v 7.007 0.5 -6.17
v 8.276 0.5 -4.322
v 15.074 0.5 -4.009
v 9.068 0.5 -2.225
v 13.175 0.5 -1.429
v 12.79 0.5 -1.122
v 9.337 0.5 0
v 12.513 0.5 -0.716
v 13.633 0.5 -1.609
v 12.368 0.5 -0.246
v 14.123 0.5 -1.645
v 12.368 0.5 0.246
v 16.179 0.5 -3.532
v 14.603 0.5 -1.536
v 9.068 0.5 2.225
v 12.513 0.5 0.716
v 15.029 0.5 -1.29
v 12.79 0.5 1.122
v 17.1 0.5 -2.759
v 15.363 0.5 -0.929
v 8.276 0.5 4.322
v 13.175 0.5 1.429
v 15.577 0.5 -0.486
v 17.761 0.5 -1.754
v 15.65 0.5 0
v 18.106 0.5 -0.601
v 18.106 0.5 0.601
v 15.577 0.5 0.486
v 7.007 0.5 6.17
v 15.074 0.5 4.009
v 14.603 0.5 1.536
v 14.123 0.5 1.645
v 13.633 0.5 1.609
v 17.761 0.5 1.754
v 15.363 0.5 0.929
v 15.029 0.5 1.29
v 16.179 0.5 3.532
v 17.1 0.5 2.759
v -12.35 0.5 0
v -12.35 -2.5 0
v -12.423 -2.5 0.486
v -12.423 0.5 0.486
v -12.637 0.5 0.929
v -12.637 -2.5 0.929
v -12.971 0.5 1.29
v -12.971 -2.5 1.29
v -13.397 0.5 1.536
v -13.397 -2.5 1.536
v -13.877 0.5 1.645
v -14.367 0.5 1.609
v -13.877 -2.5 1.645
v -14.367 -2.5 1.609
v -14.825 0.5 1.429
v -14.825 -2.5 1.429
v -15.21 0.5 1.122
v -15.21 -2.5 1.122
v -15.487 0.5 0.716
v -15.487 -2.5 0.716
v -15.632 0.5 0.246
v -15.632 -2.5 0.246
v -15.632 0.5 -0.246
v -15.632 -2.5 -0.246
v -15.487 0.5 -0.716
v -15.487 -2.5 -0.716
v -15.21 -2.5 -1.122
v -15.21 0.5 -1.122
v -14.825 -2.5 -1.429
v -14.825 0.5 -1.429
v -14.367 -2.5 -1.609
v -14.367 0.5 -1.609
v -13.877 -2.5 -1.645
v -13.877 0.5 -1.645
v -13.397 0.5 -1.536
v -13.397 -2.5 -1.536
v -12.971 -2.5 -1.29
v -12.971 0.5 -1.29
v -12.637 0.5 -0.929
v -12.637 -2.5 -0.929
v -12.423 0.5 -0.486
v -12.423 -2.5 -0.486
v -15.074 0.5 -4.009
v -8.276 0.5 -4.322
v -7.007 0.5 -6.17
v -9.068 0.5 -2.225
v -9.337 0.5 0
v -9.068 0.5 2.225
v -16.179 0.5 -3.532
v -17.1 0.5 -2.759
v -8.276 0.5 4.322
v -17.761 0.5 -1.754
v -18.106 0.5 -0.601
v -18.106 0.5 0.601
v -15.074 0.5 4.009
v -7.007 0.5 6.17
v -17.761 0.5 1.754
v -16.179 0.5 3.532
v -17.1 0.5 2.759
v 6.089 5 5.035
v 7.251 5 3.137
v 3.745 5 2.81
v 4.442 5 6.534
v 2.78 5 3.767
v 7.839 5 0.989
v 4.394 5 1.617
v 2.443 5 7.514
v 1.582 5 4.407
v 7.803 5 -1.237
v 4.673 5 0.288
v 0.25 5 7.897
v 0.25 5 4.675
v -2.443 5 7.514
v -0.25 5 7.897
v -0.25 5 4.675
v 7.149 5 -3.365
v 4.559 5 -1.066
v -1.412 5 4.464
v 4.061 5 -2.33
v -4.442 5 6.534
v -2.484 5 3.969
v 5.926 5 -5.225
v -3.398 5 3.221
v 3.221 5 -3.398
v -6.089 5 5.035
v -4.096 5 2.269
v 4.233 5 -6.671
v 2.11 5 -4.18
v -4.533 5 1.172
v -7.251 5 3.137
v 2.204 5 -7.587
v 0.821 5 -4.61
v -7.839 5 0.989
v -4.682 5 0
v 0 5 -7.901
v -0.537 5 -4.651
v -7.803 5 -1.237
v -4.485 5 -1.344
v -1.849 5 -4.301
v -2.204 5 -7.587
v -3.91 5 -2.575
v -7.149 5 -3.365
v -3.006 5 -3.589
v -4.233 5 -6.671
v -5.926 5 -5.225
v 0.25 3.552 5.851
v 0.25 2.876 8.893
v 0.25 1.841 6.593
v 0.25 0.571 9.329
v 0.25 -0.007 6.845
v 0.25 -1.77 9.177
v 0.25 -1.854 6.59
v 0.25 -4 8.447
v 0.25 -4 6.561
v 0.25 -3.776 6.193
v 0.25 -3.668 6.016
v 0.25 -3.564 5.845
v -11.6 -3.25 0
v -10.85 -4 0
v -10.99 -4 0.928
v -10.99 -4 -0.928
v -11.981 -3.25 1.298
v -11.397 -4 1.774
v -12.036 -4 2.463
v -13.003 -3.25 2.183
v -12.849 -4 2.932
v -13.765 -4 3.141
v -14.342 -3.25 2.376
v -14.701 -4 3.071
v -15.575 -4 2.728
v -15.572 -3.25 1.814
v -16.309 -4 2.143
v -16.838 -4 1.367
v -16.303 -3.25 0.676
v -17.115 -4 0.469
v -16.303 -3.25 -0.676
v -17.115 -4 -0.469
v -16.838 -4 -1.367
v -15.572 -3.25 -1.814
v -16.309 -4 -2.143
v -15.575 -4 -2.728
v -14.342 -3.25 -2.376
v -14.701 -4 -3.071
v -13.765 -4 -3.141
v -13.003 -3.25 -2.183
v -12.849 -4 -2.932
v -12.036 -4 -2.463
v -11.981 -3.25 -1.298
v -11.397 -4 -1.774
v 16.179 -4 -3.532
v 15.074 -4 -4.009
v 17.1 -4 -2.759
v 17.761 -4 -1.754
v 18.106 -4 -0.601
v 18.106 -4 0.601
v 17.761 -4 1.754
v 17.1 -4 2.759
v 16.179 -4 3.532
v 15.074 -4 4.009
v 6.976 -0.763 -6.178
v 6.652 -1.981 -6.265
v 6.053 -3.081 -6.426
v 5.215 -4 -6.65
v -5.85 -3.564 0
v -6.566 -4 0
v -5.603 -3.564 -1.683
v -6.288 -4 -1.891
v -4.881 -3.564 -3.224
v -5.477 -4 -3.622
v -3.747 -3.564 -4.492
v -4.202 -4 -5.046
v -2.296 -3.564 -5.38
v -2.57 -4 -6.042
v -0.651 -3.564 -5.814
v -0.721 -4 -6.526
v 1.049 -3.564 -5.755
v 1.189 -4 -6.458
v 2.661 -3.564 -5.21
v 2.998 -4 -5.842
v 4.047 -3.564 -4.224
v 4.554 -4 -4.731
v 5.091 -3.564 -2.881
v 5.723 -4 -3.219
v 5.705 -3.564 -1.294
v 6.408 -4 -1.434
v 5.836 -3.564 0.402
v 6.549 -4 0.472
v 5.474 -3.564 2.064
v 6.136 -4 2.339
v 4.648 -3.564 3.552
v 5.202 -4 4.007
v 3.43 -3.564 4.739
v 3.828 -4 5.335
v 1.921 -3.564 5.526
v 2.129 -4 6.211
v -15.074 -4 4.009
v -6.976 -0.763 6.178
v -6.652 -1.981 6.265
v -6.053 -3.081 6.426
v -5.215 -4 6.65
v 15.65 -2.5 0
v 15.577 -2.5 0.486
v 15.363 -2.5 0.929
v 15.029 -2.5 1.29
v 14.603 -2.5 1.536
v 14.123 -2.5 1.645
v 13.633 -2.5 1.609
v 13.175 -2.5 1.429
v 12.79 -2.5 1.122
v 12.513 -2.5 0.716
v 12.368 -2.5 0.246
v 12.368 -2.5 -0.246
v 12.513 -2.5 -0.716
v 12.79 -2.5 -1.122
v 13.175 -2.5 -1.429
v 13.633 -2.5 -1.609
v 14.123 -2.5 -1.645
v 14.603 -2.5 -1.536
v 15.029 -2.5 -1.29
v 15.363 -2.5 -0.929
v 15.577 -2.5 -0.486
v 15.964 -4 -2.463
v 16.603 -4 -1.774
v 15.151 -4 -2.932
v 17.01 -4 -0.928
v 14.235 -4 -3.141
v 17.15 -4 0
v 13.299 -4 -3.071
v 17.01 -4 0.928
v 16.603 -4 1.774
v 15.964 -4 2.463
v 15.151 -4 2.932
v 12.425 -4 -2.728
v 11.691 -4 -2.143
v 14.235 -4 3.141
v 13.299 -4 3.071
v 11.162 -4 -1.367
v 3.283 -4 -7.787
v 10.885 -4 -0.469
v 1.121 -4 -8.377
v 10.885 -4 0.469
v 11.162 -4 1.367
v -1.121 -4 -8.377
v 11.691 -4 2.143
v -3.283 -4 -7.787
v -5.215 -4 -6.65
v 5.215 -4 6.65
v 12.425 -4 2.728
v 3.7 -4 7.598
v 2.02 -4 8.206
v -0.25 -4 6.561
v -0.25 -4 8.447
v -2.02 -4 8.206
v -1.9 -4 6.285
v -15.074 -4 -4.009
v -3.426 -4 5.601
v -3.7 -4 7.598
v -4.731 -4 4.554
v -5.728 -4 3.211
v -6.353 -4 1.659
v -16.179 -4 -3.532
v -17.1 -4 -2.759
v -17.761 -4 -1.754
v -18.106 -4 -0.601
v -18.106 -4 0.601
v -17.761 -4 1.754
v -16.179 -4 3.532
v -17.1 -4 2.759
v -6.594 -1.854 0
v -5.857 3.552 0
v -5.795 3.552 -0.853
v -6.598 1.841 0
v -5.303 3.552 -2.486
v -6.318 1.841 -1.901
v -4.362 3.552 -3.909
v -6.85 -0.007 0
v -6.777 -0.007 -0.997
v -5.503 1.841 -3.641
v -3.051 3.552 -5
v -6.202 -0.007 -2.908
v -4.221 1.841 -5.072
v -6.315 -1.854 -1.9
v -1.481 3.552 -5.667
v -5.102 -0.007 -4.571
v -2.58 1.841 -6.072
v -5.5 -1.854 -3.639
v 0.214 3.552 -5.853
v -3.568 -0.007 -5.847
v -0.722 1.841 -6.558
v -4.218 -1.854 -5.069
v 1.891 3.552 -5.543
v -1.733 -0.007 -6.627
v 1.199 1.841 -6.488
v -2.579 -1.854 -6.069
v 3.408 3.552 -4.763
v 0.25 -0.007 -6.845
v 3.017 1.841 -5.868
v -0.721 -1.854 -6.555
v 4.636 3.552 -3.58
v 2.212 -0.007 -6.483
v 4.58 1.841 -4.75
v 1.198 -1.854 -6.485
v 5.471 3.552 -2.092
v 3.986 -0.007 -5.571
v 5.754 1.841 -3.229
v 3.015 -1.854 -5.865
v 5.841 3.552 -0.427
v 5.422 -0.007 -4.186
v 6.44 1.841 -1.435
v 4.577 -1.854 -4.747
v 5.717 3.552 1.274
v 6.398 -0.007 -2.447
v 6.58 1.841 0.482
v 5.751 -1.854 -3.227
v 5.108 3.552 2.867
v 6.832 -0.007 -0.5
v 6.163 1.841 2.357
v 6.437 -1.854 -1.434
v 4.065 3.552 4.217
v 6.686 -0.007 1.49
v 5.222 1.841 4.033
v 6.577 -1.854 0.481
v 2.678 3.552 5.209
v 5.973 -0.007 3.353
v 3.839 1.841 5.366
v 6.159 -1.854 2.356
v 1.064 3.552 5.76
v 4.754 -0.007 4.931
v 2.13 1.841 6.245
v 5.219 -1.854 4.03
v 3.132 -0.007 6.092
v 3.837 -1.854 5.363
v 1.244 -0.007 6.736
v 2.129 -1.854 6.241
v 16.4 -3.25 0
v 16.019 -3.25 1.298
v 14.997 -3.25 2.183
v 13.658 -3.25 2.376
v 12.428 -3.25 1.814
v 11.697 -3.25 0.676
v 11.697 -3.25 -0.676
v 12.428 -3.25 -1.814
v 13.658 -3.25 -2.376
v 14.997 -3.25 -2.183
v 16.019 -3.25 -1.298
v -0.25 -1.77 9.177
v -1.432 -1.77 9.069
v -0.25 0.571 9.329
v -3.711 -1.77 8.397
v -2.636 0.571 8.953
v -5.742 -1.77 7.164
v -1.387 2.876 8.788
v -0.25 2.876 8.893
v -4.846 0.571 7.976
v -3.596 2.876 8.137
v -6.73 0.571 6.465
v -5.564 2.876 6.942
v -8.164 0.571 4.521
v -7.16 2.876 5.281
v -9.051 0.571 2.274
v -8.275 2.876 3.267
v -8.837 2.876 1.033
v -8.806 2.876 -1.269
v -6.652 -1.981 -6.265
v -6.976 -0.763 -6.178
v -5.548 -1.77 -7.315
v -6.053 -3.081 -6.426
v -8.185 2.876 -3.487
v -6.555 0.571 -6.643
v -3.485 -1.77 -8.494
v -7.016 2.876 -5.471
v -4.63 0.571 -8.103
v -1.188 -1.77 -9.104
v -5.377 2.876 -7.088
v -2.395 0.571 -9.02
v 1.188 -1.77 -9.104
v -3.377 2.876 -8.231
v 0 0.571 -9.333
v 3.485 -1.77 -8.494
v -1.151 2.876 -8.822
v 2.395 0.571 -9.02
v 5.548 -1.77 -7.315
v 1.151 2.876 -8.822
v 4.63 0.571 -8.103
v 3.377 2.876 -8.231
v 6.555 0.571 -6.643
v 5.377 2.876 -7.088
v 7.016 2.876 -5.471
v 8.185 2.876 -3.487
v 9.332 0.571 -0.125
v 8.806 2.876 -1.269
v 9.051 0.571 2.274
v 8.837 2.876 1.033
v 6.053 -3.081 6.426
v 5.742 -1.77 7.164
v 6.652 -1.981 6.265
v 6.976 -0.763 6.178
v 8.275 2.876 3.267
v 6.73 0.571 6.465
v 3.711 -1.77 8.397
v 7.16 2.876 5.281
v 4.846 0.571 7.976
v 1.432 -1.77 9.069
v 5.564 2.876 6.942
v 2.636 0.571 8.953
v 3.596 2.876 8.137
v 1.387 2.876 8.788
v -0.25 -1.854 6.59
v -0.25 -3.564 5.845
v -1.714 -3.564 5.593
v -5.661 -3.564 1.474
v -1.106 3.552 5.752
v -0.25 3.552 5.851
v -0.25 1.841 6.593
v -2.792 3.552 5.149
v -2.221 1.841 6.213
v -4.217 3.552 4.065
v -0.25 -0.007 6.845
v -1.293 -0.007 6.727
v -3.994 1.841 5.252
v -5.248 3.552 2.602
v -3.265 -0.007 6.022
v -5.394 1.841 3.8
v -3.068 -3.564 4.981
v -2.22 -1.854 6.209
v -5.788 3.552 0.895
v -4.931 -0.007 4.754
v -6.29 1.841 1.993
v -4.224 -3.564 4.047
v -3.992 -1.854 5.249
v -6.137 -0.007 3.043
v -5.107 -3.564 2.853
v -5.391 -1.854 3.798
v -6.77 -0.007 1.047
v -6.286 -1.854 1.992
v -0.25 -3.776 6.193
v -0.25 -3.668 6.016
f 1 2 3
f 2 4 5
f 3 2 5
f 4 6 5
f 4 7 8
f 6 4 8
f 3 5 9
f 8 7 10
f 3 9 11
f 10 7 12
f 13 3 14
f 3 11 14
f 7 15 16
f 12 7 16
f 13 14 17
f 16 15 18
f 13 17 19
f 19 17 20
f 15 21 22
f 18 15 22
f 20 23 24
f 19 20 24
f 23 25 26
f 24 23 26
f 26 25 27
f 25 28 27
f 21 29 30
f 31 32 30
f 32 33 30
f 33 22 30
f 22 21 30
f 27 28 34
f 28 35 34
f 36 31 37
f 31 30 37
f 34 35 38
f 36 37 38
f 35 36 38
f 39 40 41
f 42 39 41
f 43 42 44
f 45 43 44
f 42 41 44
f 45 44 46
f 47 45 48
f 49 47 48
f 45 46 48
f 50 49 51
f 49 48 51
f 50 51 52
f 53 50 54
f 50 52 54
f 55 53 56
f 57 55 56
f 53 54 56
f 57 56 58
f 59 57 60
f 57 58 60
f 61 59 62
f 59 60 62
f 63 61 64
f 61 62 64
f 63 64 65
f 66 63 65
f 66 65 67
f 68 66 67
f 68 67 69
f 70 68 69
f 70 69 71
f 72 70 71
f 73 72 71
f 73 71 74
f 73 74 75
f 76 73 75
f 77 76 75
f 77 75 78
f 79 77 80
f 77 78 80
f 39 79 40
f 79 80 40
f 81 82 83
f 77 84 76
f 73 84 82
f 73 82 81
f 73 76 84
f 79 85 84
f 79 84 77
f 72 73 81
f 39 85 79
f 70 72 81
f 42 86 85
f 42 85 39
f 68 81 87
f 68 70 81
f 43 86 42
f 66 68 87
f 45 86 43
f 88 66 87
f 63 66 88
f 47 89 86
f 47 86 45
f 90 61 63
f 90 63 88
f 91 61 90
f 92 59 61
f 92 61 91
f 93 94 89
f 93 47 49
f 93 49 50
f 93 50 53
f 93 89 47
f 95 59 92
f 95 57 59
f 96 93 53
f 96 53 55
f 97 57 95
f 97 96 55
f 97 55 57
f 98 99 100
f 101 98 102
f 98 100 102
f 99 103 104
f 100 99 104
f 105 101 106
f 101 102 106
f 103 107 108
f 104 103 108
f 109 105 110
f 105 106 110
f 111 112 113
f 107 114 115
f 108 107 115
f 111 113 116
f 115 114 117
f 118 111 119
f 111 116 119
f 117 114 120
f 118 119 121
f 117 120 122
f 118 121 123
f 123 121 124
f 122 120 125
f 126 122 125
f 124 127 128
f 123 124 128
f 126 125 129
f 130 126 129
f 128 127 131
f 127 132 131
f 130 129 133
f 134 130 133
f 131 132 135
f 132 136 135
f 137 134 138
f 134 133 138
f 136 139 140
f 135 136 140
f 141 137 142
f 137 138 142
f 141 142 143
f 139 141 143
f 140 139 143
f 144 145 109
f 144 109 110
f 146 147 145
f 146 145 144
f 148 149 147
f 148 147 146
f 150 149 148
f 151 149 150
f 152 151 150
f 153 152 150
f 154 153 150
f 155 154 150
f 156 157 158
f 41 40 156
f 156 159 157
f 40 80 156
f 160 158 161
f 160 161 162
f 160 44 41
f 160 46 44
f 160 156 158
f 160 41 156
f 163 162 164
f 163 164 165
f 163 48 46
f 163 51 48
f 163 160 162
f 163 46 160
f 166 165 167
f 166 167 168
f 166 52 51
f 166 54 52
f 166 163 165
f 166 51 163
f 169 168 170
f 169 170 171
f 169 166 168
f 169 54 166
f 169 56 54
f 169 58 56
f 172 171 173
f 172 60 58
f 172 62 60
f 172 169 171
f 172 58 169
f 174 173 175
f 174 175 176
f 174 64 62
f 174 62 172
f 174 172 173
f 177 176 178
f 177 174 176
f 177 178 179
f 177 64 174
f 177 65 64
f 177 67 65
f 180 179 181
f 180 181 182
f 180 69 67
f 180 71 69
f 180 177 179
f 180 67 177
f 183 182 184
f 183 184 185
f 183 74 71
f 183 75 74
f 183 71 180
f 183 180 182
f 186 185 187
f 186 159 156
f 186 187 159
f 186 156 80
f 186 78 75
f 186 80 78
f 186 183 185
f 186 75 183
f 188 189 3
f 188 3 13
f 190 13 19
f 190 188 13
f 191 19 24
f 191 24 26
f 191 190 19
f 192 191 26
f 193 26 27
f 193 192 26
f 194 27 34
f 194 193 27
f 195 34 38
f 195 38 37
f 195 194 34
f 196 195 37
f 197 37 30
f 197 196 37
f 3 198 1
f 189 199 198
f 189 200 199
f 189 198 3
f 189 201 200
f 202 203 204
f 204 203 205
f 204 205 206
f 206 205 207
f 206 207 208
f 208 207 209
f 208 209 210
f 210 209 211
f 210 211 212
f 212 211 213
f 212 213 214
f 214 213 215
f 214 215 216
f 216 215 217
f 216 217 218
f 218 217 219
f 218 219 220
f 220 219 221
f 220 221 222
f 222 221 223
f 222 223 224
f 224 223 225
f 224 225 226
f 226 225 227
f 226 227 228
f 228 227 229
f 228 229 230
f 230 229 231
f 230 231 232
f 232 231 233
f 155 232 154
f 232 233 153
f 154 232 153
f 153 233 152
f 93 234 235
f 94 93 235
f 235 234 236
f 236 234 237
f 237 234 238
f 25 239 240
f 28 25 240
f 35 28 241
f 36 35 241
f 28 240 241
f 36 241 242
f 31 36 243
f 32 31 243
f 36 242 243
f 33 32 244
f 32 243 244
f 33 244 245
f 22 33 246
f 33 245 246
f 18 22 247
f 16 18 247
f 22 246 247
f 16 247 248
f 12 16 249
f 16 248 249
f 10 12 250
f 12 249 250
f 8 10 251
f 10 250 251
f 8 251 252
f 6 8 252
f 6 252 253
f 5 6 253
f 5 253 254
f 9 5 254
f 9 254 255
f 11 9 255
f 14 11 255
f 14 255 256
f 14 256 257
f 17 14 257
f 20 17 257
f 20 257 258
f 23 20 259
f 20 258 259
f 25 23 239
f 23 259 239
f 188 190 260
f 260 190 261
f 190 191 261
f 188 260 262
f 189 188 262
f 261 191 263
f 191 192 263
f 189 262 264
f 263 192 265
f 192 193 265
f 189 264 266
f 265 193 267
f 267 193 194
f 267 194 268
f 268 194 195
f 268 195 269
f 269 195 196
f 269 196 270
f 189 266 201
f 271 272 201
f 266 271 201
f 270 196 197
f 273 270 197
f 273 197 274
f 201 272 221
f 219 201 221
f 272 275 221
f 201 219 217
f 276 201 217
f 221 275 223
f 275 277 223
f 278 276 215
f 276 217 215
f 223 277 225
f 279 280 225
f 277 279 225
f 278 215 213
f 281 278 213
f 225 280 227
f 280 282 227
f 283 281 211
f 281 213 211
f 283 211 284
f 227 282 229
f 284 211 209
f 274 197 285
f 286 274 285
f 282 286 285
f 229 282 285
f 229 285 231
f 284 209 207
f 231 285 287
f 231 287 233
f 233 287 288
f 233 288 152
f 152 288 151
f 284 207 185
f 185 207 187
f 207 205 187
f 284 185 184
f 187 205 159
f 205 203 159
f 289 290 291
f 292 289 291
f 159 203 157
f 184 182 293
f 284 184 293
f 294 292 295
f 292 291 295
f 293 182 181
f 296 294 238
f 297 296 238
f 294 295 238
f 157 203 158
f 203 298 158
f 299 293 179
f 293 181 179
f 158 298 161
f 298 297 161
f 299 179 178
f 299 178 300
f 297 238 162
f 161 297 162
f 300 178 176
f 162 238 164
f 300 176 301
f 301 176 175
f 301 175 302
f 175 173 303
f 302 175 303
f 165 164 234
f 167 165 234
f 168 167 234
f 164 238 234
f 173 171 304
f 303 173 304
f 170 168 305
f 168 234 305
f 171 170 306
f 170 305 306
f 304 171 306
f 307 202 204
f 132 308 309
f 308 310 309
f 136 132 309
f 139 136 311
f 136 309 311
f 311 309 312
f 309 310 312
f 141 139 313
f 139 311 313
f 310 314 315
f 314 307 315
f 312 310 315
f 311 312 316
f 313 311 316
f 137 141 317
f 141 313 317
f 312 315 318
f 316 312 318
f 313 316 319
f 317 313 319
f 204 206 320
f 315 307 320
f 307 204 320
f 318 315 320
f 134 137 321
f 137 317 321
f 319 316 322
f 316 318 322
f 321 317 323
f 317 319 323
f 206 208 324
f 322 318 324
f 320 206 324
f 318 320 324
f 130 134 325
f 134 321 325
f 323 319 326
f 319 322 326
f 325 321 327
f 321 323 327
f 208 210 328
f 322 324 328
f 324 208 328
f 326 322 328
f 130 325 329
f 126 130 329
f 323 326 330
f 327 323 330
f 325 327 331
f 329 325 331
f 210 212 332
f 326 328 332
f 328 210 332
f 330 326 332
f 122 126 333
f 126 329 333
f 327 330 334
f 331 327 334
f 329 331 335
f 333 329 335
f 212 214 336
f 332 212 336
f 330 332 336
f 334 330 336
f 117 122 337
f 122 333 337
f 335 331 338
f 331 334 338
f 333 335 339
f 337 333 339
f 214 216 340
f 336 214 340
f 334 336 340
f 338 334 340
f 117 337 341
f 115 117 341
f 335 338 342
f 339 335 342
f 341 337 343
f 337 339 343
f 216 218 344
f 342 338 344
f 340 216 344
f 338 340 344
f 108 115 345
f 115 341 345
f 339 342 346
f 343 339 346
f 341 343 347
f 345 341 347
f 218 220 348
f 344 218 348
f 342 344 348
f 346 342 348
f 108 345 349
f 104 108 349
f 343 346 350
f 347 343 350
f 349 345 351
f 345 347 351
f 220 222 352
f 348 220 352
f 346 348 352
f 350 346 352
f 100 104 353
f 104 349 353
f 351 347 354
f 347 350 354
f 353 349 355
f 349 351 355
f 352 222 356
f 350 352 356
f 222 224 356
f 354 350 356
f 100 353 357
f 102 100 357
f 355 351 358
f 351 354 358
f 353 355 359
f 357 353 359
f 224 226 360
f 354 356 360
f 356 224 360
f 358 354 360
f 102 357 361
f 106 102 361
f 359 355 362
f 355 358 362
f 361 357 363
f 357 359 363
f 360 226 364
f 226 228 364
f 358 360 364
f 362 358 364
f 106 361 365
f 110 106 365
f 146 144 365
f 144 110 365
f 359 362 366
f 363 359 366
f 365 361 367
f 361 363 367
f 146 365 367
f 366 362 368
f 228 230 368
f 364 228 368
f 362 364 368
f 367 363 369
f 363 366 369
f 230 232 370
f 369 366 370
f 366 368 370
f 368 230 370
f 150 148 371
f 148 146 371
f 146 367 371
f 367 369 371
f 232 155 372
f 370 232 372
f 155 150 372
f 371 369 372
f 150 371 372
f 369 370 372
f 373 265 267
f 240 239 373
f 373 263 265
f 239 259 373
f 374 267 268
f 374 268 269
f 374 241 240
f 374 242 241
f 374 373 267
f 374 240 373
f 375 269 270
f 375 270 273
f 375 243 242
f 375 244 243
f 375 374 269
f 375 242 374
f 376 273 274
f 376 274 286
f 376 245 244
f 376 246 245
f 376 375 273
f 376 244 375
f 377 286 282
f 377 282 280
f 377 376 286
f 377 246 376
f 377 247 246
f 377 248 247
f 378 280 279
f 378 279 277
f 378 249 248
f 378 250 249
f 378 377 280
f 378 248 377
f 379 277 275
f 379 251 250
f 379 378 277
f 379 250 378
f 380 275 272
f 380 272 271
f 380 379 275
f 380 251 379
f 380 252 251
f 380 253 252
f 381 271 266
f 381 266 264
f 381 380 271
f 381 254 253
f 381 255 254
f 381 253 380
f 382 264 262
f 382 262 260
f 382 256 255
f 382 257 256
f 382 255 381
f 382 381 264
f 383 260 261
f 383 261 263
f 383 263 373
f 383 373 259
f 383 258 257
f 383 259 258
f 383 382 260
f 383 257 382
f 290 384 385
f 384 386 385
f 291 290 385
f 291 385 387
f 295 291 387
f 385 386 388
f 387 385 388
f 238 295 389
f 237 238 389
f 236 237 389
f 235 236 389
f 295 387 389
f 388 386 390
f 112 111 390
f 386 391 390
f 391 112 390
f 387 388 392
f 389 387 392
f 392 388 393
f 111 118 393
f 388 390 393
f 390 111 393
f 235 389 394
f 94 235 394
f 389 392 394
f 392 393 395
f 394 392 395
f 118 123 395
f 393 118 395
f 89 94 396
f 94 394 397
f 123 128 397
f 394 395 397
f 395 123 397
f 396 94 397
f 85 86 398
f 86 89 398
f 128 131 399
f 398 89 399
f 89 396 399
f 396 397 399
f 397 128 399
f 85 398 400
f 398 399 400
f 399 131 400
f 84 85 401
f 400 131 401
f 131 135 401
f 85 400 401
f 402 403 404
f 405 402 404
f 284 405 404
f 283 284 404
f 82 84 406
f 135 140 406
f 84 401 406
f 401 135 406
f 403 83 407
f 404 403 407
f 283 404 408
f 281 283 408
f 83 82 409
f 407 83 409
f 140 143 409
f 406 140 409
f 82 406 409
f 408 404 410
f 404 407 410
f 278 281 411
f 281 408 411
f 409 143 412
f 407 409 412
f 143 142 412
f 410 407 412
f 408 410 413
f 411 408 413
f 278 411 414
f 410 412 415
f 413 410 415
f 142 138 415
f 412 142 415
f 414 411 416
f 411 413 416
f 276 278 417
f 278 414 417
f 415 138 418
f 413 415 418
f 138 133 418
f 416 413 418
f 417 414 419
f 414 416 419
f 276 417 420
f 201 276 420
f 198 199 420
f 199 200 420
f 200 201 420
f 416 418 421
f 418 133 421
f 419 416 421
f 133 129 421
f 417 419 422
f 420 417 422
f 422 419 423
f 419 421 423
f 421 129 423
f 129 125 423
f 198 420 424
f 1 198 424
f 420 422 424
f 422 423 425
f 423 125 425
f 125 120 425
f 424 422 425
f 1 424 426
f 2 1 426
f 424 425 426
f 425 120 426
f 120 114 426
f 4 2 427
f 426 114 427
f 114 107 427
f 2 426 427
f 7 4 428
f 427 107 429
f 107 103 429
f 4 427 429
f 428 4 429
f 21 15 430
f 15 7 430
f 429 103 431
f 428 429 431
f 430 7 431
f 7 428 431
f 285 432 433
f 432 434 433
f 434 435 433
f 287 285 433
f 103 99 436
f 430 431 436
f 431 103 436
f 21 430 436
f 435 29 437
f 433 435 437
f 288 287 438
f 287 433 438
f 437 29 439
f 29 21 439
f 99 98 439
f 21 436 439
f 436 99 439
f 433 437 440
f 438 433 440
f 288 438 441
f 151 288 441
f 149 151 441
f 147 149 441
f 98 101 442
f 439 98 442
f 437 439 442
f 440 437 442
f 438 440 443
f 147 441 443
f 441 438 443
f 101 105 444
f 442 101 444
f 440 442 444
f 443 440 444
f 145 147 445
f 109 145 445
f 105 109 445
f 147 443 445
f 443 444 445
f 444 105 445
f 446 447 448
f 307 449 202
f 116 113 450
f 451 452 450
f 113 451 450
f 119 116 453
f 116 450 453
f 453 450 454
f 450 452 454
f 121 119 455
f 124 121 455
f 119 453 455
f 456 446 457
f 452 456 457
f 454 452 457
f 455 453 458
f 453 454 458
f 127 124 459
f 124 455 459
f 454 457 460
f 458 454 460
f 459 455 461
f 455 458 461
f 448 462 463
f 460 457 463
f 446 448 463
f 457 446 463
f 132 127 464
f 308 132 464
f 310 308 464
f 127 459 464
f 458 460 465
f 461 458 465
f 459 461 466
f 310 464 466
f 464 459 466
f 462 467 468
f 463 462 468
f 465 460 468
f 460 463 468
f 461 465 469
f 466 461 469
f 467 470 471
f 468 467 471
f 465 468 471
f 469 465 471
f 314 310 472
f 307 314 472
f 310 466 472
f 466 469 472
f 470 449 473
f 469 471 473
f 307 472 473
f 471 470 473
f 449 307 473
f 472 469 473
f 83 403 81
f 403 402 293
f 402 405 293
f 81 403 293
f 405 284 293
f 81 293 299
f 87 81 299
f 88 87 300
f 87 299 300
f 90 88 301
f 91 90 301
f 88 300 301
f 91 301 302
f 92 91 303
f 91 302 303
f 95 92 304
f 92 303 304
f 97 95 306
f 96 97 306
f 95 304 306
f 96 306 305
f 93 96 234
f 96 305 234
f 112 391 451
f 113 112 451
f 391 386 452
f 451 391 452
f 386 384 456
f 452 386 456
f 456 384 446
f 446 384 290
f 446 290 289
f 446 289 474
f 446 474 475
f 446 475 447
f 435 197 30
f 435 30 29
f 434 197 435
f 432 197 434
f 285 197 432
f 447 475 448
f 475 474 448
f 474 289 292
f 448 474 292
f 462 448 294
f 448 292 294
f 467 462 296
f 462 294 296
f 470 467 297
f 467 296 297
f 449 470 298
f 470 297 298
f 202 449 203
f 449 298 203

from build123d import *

# Parameters (mm, degrees)
ESQUISSE3_R                          = 1.65
BOSS_EXTRU_1_DEPTH                   = 4.5
CHANFREIN1_SIZE                      = 1.5
ENL_V_DE_MAT_EXTRU_MINCE1_DEPTH      = 23.312440476
ENL_V_DE_MAT_EXTRU_MINCE1_DEPTH_BACK = 23.312440476
ESQUISSE4_W                          = 0.5
ESQUISSE4_H                          = 9.35


with BuildPart() as part:
    # Esquisse1 → Révolution1 (revolve)
    with BuildSketch(Plane.XY):
        with BuildLine():
            Line((-5.85, -3.563705936), (-6.566198339, -4))
            Line((-6.566198339, -4), (-8.451183349, -4))
            ThreePointArc((-8.451183349, -4), (-9.332564872, 0.570730153), (-7.9007911, 5))
            Line((-7.9007911, 5), (-4.682146943, 5))
            ThreePointArc((-4.682146943, 5), (-6.787178696, 0.925583789), (-5.85, -3.563705936))
        make_face()
    revolve(axis=Axis((0, 11.493598295, 0), (0, -1, 0)))

    # Esquisse3 → Boss.-Extru.1 (add)
    # profile 1 of 2: a face of its own
    with BuildSketch(Plane.XZ.offset(4)):
        with BuildLine():
            Line((-15.074099037, 4.008592179), (-3.376482998, 7.14295895))
            ThreePointArc((-3.376482998, 7.14295895), (-7.9007911, 0), (-3.376482998, -7.14295895))
            Line((-3.376482998, -7.14295895), (-15.074099037, -4.008592179))
            ThreePointArc((-15.074099037, -4.008592179), (-18.15, 0), (-15.074099037, 4.008592179))
        make_face()
        with Locations((-14, 0)):
            Circle(ESQUISSE3_R, mode=Mode.SUBTRACT)
    # profile 2 of 2: a face of its own
    with BuildSketch(Plane.XZ.offset(4)):
        with BuildLine():
            Line((15.074099037, 4.008592179), (3.376482998, 7.14295895))
            ThreePointArc((3.376482998, 7.14295895), (7.9007911, 0), (3.376482998, -7.14295895))
            Line((3.376482998, -7.14295895), (15.074099037, -4.008592179))
            ThreePointArc((15.074099037, -4.008592179), (18.15, 0), (15.074099037, 4.008592179))
        make_face()
        with Locations((14, 0)):
            Circle(ESQUISSE3_R, mode=Mode.SUBTRACT)
    extrude(amount=-BOSS_EXTRU_1_DEPTH)

    # Chanfrein1
    chanfrein1_edges = [part.edges().sort_by_distance(p)[0] for p in [
        (12.35, -4, 0),
        (-15.65, -4, 0),
    ]]
    chamfer(chanfrein1_edges, length=CHANFREIN1_SIZE)

    # Esquisse4 → Enlèv. de mat.-Extru.-Mince1 (cut, two sides: drawn at the far end of the back side and taken through both)
    with BuildSketch(Plane(origin=(0, 5, 0), x_dir=(1, 0, 0), z_dir=(0, 1, 0)).offset(-ENL_V_DE_MAT_EXTRU_MINCE1_DEPTH_BACK)):
        with Locations((0, -4.675)):
            Rectangle(ESQUISSE4_W, ESQUISSE4_H)
    extrude(amount=ENL_V_DE_MAT_EXTRU_MINCE1_DEPTH + ENL_V_DE_MAT_EXTRU_MINCE1_DEPTH_BACK, mode=Mode.SUBTRACT)


solid = part.part
